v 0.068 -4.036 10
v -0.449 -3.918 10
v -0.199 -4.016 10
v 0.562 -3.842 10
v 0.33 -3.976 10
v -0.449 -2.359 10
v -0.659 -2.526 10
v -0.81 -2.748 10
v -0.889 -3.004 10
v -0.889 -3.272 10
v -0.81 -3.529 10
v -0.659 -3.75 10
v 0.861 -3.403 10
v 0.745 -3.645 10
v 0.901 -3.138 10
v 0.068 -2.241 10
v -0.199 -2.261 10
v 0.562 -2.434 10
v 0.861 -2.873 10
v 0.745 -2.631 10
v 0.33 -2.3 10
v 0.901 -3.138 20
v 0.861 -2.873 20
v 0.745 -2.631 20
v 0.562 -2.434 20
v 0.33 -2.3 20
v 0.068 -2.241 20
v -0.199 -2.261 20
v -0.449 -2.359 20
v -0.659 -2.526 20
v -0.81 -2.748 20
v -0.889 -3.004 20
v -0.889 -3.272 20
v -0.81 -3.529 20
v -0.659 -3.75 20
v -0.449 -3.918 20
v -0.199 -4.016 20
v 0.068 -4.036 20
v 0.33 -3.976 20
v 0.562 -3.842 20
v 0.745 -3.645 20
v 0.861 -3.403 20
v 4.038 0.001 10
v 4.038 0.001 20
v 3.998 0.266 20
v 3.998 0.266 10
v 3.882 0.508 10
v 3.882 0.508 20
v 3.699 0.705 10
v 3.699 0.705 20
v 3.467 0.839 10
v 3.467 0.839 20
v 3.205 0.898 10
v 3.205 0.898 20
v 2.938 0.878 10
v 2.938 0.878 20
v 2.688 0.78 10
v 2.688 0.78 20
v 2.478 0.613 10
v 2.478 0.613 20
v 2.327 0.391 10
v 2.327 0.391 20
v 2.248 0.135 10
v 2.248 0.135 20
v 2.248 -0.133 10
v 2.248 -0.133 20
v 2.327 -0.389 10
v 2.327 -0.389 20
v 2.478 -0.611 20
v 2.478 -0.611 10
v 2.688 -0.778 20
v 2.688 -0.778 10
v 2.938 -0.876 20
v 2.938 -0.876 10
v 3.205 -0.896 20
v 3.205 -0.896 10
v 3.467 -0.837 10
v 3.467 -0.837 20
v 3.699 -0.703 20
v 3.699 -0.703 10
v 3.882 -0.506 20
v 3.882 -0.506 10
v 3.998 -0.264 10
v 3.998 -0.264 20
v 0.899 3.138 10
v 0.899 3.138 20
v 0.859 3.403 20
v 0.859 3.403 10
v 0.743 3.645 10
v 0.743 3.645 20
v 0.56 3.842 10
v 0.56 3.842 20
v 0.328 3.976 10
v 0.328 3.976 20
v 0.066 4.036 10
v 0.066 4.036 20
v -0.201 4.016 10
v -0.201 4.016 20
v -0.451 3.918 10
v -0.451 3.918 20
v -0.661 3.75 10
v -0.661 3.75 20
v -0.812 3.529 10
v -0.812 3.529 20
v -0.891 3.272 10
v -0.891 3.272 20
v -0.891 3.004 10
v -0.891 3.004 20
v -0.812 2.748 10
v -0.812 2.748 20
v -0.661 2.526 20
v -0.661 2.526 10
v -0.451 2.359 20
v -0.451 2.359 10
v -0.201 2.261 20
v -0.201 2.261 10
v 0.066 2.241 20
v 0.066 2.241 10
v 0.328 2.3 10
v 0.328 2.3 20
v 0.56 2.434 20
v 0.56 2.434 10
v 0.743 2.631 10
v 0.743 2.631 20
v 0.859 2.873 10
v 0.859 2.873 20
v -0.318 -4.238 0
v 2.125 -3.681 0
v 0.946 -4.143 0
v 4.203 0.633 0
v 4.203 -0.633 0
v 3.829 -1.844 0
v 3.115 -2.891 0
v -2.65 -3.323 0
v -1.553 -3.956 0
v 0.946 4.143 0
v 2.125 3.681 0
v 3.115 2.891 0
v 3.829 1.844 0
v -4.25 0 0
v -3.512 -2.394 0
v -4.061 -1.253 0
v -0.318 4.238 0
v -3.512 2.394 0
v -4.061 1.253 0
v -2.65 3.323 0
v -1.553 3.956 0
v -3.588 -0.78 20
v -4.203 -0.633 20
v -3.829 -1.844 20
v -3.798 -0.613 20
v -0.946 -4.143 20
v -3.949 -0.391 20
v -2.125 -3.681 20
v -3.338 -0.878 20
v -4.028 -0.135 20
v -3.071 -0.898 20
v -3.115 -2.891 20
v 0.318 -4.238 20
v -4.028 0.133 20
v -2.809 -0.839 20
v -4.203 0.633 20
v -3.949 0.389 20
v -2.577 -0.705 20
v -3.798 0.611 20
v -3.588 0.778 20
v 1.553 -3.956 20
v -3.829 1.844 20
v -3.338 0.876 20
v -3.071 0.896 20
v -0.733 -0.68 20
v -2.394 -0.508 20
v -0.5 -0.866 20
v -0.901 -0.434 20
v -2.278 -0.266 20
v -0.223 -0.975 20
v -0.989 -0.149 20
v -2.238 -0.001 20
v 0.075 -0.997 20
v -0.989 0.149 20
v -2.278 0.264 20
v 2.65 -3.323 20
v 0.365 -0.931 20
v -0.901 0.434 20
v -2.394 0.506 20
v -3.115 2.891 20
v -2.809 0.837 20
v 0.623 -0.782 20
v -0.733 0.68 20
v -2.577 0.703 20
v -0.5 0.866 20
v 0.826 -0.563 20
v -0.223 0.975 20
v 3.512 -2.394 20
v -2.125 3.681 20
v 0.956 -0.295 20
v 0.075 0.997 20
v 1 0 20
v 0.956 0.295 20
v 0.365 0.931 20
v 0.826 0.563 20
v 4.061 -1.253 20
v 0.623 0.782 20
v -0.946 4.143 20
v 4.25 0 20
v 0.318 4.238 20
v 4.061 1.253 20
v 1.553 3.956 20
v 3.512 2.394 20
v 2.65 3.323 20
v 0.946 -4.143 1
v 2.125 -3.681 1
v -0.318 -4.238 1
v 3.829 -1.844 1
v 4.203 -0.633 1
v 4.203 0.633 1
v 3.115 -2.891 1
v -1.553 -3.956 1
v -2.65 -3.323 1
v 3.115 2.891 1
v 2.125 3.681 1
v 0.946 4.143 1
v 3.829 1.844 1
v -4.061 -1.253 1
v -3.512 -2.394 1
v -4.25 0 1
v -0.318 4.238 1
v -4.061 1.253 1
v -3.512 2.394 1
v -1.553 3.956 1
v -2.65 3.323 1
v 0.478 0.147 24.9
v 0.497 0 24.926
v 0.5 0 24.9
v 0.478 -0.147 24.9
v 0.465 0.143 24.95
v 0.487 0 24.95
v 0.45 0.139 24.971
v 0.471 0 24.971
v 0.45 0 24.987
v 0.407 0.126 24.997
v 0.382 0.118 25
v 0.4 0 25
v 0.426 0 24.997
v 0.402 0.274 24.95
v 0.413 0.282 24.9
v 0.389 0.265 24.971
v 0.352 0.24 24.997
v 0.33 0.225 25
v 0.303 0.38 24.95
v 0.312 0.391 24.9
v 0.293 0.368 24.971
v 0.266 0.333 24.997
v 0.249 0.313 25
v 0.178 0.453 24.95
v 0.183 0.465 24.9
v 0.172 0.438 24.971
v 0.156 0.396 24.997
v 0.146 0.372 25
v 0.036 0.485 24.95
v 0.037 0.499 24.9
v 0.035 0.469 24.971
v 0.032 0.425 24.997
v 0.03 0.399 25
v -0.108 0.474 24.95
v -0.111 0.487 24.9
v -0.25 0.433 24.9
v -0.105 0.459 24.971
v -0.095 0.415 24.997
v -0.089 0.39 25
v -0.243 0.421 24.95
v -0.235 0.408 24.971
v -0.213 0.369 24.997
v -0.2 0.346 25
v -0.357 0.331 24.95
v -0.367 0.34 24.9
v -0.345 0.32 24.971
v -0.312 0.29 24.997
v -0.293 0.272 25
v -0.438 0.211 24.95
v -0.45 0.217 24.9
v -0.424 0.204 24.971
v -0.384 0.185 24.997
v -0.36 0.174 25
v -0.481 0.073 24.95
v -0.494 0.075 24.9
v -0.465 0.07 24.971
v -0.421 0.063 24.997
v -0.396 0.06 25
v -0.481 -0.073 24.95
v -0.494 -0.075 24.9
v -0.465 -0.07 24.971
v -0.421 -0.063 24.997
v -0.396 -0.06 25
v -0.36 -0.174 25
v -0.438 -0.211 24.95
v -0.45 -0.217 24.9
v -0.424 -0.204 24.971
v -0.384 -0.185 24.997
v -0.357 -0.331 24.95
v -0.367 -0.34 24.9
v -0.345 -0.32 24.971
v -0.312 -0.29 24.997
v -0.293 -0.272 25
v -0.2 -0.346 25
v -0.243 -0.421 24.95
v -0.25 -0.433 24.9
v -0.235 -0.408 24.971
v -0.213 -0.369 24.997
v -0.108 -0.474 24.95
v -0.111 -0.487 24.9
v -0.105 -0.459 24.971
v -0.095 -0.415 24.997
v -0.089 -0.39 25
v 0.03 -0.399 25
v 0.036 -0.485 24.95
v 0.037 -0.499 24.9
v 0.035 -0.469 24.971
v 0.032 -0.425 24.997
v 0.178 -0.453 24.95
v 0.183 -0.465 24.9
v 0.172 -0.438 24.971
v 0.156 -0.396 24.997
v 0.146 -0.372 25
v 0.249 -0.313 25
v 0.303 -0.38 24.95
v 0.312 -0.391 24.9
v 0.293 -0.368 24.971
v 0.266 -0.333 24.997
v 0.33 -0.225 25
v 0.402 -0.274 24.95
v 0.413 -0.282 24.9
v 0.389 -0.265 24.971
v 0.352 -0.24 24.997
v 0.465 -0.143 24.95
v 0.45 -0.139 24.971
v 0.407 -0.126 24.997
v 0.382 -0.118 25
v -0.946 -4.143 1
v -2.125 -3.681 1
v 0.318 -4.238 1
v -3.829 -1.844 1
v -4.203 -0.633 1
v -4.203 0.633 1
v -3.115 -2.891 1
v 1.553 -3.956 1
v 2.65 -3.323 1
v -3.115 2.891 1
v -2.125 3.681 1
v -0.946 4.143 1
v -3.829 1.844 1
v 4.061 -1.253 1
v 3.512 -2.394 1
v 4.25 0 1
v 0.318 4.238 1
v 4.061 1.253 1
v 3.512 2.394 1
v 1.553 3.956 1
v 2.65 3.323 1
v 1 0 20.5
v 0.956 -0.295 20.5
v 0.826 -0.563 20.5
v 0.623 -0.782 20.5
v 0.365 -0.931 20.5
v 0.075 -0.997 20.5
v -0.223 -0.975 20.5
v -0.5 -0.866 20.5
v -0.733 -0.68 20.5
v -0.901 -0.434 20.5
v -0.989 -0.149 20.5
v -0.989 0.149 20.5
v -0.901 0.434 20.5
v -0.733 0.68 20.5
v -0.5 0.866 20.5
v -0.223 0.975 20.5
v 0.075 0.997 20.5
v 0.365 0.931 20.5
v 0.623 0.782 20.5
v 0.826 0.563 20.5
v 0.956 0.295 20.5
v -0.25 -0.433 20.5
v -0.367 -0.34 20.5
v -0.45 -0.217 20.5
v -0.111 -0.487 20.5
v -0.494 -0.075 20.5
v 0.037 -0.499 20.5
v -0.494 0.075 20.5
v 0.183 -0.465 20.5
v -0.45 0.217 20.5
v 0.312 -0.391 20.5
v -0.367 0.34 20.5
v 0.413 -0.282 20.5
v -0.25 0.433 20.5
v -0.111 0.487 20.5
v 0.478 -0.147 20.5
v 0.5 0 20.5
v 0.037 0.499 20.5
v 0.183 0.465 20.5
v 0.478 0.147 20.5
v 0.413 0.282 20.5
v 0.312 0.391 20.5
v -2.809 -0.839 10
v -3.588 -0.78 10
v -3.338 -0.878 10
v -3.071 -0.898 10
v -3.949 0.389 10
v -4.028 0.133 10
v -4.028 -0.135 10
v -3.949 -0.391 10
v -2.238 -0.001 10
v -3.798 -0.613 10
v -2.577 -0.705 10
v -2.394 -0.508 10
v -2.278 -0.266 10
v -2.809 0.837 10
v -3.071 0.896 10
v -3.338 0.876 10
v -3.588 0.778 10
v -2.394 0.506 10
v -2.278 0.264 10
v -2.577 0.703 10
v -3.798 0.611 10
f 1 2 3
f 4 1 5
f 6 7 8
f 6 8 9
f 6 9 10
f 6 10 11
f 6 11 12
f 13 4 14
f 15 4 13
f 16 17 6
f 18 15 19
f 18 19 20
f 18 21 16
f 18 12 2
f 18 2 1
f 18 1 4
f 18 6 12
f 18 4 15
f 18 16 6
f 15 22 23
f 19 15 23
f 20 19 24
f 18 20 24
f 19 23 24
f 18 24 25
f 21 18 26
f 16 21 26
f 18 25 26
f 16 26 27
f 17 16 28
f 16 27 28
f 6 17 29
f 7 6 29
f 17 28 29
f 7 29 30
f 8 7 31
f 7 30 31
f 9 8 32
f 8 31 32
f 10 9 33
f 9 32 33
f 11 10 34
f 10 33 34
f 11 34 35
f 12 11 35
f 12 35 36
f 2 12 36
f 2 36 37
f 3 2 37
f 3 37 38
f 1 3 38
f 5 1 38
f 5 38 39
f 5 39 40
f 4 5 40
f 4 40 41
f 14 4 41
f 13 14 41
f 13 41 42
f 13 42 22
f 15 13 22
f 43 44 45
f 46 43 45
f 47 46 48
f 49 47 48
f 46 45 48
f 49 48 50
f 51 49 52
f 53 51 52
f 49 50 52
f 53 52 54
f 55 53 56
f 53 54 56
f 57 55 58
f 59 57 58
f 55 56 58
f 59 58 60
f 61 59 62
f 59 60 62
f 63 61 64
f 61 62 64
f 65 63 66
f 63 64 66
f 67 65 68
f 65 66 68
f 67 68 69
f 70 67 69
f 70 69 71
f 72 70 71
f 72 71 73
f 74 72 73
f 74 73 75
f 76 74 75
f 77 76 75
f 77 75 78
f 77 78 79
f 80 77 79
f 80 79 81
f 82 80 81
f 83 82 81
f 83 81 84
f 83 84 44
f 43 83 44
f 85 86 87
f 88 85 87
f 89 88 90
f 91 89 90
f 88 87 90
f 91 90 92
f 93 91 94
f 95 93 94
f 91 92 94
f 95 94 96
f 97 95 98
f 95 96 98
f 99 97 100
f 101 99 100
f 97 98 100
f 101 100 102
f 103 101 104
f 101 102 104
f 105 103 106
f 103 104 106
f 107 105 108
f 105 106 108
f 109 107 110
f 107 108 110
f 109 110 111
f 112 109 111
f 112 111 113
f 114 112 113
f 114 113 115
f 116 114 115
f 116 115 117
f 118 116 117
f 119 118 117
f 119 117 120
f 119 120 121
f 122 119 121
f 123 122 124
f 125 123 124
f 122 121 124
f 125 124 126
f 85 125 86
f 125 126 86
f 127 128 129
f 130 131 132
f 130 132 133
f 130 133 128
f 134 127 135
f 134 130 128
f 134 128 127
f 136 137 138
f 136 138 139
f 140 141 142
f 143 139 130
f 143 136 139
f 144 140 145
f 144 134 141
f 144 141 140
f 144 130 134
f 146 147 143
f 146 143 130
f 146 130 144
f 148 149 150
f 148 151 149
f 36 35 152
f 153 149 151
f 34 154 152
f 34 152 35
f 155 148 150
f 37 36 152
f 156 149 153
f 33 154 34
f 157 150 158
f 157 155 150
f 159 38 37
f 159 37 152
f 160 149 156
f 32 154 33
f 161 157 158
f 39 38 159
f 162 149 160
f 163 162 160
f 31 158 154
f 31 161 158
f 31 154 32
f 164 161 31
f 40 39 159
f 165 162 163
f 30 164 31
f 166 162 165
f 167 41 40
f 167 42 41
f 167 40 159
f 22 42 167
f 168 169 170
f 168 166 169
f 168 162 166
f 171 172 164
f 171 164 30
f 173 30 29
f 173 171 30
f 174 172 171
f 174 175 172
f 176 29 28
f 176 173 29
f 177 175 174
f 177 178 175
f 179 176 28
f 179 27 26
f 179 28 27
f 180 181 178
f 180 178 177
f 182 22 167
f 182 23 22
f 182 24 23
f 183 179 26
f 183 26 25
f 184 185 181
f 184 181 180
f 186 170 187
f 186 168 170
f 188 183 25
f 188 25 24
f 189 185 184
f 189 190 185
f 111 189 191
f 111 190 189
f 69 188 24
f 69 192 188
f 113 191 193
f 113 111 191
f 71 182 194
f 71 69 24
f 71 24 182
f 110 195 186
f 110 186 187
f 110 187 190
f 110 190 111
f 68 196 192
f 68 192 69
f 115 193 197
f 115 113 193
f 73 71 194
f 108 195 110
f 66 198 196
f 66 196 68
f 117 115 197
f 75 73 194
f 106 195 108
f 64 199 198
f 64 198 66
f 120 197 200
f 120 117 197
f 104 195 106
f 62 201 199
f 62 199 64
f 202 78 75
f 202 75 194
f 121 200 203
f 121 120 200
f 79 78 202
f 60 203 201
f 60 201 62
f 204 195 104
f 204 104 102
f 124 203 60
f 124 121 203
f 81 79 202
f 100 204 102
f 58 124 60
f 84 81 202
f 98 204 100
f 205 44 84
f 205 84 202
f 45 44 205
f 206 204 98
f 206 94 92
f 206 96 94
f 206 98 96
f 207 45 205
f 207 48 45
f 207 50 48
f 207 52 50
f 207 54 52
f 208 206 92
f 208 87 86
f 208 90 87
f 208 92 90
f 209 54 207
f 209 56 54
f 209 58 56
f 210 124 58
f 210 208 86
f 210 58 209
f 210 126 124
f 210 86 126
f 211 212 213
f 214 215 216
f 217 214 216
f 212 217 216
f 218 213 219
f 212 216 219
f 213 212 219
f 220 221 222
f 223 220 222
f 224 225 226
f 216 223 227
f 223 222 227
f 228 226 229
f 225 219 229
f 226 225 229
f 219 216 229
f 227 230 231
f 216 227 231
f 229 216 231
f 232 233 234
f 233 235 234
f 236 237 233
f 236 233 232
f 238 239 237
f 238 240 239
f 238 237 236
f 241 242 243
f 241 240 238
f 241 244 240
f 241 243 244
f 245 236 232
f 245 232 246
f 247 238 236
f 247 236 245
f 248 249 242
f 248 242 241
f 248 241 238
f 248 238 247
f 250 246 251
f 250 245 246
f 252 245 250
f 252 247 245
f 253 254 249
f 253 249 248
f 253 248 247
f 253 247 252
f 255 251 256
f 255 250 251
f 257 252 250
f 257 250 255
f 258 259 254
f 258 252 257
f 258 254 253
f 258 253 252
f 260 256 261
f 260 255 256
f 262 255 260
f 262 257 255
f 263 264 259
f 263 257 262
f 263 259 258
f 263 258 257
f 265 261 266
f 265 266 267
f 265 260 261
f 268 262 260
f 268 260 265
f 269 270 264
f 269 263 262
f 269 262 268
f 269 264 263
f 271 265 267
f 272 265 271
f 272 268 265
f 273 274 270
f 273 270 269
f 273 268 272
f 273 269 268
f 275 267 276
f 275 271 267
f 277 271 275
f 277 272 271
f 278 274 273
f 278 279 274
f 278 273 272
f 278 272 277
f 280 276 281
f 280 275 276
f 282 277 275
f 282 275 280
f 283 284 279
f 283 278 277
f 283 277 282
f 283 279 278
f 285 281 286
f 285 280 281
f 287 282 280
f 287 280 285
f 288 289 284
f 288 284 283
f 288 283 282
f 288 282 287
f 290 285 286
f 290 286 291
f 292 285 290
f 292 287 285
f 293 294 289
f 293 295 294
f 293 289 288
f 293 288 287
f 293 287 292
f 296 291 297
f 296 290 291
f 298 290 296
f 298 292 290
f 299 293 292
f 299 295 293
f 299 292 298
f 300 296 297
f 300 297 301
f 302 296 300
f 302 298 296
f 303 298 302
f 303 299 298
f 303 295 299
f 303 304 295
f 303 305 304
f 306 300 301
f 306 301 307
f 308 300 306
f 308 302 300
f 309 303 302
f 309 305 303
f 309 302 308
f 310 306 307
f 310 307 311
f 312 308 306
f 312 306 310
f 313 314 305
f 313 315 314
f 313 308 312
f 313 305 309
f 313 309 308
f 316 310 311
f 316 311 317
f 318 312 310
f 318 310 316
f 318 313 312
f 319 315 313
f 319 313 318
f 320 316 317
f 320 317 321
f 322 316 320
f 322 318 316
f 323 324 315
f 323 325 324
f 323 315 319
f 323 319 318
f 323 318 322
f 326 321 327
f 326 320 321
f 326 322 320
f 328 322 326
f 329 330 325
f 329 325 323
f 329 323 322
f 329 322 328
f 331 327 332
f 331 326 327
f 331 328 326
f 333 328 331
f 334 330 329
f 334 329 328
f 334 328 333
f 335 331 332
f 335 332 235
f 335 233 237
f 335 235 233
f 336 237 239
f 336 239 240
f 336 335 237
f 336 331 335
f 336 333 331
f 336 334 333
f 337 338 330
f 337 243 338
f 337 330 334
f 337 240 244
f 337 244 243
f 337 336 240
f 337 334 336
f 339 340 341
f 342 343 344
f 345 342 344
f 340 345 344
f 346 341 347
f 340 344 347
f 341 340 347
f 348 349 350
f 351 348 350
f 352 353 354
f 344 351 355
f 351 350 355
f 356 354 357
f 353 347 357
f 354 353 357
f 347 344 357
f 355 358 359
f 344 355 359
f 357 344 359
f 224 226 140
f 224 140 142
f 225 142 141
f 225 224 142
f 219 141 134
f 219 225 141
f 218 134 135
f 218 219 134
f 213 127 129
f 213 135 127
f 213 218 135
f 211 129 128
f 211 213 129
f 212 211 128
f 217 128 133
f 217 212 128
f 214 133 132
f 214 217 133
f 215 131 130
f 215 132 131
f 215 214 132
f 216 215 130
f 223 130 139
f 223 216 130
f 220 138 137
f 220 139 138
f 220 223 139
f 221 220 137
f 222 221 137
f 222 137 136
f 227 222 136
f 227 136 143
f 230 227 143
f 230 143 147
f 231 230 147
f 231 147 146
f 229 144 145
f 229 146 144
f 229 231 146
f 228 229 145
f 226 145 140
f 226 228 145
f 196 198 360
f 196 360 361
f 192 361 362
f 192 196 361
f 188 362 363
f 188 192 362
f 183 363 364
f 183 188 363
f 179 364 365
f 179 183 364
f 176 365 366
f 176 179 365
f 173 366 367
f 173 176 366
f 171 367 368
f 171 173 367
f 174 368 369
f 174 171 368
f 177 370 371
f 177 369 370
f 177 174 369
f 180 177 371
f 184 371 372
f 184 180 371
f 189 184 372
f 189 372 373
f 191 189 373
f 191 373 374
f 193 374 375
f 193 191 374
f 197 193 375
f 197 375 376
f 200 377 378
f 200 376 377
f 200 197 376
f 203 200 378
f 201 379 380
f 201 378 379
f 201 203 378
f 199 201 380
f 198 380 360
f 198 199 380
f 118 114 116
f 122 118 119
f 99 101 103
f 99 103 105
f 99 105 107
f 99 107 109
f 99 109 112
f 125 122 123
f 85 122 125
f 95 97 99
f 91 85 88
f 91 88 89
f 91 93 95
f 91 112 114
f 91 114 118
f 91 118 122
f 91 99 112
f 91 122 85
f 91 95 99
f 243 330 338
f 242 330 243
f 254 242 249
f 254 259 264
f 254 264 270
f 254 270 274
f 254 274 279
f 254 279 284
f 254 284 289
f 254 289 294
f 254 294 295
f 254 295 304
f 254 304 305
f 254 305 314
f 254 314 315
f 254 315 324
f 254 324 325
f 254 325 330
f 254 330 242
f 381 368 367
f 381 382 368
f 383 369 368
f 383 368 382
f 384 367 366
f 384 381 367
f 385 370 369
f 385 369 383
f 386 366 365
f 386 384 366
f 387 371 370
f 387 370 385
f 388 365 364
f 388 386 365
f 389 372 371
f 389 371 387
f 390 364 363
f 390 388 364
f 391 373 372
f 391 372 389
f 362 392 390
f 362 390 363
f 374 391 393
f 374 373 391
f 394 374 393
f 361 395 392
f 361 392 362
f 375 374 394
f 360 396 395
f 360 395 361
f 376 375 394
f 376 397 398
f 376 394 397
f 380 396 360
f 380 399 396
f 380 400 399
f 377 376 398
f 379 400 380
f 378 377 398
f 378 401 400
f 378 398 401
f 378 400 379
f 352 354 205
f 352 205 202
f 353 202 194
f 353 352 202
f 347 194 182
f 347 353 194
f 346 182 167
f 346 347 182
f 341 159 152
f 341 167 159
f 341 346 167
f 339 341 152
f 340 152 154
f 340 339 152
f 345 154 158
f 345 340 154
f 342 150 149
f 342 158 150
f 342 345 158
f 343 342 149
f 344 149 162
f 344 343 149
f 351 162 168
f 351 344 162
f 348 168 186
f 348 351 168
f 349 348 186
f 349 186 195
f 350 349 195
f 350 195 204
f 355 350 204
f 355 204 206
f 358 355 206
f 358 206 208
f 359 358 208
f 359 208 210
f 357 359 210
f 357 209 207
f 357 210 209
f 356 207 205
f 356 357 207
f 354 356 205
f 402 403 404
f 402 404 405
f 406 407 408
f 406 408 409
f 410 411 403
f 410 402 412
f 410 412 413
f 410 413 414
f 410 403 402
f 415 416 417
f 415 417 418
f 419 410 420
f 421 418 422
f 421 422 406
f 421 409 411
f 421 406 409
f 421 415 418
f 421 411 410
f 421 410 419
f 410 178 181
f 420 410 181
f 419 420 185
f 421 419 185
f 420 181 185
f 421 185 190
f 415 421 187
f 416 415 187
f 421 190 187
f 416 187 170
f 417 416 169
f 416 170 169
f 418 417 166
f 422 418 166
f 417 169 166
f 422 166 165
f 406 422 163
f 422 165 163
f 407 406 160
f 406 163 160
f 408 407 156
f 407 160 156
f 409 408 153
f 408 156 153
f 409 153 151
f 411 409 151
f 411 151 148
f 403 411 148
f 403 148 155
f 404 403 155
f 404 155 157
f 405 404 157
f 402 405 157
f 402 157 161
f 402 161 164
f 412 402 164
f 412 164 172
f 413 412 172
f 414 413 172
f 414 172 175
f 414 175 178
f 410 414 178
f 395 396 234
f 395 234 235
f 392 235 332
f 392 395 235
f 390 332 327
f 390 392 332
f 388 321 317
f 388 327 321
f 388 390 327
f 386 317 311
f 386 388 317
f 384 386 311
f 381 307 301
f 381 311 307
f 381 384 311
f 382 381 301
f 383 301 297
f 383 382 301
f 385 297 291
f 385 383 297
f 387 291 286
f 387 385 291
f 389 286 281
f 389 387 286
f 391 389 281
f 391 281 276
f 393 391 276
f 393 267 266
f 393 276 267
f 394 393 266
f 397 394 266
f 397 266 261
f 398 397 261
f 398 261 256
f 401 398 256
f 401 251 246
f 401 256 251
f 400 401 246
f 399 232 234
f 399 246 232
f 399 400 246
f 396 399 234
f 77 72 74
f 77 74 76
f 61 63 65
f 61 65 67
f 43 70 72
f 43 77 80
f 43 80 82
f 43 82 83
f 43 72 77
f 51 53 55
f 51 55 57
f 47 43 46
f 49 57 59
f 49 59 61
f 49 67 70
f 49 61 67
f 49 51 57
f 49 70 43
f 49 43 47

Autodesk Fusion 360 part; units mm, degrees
sketch "Sketch1" plane through (0, 0, 0) normal (0, 0, 1) x (1, 0, 0)
  circle A0 centre (0, 0) radius 4.25
  dimension "d1" = 8.5
extrude "Extrude1" add sketch "Sketch1" along normal blind 20 makes body 1
sketch "Sketch2" plane through (0, 0, 20) normal (0, 0, 1) x (1, 0, 0)
  circle A0 centre (0, 0) radius 4.25
  circle A1 centre (0, 0) radius 0.5
  dimension "d4" = 1
extrude "Extrude2" add sketch "Sketch2" along normal blind 5 contours A1 bodies 1
fillet "Fillet2" radius 0.1 1 edges at (-0.4662, -0.1808, 25) on bodies 1
extrude "Extrude3" cut 1 faces at (1.2134, 0.1971, 0) along direction (0, 0, 1) blind 1 on bodies 1 bodies 1
sketch "Sketch3" plane through (0, 0, 1) normal (0, 0, -1) x (-1, 0, 0)
  circle A0 centre (0, 0) radius 4.25
extrude "Extrude4" add sketch "Sketch3" along normal blind 1 separate body makes body 2
sketch "Sketch4" plane through (0, 0, 20) normal (0, 0, 1) x (1, 0, 0)
  circle A0 centre (0, 0) radius 0.5
  circle A1 centre (0, 0) radius 4.25
  circle A2 centre (0, 0) radius 1
  dimension "d13" = 2
extrude "Extrude5" add sketch "Sketch4" along normal blind 0.5 contours A2 bodies 1
sketch "Sketch5" plane through (0, 0, 20) normal (0, 0, 1) x (1, 0, 0)
  circle A0 centre (0, 0) radius 1
  circle A1 centre (0, 0) radius 4.25
  circle A2 centre (0.001, -3.1381) radius 0.9
  line L0 (0, 0) -> (0, 0.0971)
  line L1 (0, 0.0971) -> (0, 1.4335) construction
  circle A3 centre (3.1381, 0.001) radius 0.9
  circle A4 centre (-0.001, 3.1381) radius 0.9
  circle A5 centre (-3.1381, -0.001) radius 0.9
  dimension "d16" = 1.8
  dimension "d18" = 360
extrude "Extrude6" cut sketch "Sketch5" against normal blind 10 contours A2 | A3 | A4 | A5 bodies 1
